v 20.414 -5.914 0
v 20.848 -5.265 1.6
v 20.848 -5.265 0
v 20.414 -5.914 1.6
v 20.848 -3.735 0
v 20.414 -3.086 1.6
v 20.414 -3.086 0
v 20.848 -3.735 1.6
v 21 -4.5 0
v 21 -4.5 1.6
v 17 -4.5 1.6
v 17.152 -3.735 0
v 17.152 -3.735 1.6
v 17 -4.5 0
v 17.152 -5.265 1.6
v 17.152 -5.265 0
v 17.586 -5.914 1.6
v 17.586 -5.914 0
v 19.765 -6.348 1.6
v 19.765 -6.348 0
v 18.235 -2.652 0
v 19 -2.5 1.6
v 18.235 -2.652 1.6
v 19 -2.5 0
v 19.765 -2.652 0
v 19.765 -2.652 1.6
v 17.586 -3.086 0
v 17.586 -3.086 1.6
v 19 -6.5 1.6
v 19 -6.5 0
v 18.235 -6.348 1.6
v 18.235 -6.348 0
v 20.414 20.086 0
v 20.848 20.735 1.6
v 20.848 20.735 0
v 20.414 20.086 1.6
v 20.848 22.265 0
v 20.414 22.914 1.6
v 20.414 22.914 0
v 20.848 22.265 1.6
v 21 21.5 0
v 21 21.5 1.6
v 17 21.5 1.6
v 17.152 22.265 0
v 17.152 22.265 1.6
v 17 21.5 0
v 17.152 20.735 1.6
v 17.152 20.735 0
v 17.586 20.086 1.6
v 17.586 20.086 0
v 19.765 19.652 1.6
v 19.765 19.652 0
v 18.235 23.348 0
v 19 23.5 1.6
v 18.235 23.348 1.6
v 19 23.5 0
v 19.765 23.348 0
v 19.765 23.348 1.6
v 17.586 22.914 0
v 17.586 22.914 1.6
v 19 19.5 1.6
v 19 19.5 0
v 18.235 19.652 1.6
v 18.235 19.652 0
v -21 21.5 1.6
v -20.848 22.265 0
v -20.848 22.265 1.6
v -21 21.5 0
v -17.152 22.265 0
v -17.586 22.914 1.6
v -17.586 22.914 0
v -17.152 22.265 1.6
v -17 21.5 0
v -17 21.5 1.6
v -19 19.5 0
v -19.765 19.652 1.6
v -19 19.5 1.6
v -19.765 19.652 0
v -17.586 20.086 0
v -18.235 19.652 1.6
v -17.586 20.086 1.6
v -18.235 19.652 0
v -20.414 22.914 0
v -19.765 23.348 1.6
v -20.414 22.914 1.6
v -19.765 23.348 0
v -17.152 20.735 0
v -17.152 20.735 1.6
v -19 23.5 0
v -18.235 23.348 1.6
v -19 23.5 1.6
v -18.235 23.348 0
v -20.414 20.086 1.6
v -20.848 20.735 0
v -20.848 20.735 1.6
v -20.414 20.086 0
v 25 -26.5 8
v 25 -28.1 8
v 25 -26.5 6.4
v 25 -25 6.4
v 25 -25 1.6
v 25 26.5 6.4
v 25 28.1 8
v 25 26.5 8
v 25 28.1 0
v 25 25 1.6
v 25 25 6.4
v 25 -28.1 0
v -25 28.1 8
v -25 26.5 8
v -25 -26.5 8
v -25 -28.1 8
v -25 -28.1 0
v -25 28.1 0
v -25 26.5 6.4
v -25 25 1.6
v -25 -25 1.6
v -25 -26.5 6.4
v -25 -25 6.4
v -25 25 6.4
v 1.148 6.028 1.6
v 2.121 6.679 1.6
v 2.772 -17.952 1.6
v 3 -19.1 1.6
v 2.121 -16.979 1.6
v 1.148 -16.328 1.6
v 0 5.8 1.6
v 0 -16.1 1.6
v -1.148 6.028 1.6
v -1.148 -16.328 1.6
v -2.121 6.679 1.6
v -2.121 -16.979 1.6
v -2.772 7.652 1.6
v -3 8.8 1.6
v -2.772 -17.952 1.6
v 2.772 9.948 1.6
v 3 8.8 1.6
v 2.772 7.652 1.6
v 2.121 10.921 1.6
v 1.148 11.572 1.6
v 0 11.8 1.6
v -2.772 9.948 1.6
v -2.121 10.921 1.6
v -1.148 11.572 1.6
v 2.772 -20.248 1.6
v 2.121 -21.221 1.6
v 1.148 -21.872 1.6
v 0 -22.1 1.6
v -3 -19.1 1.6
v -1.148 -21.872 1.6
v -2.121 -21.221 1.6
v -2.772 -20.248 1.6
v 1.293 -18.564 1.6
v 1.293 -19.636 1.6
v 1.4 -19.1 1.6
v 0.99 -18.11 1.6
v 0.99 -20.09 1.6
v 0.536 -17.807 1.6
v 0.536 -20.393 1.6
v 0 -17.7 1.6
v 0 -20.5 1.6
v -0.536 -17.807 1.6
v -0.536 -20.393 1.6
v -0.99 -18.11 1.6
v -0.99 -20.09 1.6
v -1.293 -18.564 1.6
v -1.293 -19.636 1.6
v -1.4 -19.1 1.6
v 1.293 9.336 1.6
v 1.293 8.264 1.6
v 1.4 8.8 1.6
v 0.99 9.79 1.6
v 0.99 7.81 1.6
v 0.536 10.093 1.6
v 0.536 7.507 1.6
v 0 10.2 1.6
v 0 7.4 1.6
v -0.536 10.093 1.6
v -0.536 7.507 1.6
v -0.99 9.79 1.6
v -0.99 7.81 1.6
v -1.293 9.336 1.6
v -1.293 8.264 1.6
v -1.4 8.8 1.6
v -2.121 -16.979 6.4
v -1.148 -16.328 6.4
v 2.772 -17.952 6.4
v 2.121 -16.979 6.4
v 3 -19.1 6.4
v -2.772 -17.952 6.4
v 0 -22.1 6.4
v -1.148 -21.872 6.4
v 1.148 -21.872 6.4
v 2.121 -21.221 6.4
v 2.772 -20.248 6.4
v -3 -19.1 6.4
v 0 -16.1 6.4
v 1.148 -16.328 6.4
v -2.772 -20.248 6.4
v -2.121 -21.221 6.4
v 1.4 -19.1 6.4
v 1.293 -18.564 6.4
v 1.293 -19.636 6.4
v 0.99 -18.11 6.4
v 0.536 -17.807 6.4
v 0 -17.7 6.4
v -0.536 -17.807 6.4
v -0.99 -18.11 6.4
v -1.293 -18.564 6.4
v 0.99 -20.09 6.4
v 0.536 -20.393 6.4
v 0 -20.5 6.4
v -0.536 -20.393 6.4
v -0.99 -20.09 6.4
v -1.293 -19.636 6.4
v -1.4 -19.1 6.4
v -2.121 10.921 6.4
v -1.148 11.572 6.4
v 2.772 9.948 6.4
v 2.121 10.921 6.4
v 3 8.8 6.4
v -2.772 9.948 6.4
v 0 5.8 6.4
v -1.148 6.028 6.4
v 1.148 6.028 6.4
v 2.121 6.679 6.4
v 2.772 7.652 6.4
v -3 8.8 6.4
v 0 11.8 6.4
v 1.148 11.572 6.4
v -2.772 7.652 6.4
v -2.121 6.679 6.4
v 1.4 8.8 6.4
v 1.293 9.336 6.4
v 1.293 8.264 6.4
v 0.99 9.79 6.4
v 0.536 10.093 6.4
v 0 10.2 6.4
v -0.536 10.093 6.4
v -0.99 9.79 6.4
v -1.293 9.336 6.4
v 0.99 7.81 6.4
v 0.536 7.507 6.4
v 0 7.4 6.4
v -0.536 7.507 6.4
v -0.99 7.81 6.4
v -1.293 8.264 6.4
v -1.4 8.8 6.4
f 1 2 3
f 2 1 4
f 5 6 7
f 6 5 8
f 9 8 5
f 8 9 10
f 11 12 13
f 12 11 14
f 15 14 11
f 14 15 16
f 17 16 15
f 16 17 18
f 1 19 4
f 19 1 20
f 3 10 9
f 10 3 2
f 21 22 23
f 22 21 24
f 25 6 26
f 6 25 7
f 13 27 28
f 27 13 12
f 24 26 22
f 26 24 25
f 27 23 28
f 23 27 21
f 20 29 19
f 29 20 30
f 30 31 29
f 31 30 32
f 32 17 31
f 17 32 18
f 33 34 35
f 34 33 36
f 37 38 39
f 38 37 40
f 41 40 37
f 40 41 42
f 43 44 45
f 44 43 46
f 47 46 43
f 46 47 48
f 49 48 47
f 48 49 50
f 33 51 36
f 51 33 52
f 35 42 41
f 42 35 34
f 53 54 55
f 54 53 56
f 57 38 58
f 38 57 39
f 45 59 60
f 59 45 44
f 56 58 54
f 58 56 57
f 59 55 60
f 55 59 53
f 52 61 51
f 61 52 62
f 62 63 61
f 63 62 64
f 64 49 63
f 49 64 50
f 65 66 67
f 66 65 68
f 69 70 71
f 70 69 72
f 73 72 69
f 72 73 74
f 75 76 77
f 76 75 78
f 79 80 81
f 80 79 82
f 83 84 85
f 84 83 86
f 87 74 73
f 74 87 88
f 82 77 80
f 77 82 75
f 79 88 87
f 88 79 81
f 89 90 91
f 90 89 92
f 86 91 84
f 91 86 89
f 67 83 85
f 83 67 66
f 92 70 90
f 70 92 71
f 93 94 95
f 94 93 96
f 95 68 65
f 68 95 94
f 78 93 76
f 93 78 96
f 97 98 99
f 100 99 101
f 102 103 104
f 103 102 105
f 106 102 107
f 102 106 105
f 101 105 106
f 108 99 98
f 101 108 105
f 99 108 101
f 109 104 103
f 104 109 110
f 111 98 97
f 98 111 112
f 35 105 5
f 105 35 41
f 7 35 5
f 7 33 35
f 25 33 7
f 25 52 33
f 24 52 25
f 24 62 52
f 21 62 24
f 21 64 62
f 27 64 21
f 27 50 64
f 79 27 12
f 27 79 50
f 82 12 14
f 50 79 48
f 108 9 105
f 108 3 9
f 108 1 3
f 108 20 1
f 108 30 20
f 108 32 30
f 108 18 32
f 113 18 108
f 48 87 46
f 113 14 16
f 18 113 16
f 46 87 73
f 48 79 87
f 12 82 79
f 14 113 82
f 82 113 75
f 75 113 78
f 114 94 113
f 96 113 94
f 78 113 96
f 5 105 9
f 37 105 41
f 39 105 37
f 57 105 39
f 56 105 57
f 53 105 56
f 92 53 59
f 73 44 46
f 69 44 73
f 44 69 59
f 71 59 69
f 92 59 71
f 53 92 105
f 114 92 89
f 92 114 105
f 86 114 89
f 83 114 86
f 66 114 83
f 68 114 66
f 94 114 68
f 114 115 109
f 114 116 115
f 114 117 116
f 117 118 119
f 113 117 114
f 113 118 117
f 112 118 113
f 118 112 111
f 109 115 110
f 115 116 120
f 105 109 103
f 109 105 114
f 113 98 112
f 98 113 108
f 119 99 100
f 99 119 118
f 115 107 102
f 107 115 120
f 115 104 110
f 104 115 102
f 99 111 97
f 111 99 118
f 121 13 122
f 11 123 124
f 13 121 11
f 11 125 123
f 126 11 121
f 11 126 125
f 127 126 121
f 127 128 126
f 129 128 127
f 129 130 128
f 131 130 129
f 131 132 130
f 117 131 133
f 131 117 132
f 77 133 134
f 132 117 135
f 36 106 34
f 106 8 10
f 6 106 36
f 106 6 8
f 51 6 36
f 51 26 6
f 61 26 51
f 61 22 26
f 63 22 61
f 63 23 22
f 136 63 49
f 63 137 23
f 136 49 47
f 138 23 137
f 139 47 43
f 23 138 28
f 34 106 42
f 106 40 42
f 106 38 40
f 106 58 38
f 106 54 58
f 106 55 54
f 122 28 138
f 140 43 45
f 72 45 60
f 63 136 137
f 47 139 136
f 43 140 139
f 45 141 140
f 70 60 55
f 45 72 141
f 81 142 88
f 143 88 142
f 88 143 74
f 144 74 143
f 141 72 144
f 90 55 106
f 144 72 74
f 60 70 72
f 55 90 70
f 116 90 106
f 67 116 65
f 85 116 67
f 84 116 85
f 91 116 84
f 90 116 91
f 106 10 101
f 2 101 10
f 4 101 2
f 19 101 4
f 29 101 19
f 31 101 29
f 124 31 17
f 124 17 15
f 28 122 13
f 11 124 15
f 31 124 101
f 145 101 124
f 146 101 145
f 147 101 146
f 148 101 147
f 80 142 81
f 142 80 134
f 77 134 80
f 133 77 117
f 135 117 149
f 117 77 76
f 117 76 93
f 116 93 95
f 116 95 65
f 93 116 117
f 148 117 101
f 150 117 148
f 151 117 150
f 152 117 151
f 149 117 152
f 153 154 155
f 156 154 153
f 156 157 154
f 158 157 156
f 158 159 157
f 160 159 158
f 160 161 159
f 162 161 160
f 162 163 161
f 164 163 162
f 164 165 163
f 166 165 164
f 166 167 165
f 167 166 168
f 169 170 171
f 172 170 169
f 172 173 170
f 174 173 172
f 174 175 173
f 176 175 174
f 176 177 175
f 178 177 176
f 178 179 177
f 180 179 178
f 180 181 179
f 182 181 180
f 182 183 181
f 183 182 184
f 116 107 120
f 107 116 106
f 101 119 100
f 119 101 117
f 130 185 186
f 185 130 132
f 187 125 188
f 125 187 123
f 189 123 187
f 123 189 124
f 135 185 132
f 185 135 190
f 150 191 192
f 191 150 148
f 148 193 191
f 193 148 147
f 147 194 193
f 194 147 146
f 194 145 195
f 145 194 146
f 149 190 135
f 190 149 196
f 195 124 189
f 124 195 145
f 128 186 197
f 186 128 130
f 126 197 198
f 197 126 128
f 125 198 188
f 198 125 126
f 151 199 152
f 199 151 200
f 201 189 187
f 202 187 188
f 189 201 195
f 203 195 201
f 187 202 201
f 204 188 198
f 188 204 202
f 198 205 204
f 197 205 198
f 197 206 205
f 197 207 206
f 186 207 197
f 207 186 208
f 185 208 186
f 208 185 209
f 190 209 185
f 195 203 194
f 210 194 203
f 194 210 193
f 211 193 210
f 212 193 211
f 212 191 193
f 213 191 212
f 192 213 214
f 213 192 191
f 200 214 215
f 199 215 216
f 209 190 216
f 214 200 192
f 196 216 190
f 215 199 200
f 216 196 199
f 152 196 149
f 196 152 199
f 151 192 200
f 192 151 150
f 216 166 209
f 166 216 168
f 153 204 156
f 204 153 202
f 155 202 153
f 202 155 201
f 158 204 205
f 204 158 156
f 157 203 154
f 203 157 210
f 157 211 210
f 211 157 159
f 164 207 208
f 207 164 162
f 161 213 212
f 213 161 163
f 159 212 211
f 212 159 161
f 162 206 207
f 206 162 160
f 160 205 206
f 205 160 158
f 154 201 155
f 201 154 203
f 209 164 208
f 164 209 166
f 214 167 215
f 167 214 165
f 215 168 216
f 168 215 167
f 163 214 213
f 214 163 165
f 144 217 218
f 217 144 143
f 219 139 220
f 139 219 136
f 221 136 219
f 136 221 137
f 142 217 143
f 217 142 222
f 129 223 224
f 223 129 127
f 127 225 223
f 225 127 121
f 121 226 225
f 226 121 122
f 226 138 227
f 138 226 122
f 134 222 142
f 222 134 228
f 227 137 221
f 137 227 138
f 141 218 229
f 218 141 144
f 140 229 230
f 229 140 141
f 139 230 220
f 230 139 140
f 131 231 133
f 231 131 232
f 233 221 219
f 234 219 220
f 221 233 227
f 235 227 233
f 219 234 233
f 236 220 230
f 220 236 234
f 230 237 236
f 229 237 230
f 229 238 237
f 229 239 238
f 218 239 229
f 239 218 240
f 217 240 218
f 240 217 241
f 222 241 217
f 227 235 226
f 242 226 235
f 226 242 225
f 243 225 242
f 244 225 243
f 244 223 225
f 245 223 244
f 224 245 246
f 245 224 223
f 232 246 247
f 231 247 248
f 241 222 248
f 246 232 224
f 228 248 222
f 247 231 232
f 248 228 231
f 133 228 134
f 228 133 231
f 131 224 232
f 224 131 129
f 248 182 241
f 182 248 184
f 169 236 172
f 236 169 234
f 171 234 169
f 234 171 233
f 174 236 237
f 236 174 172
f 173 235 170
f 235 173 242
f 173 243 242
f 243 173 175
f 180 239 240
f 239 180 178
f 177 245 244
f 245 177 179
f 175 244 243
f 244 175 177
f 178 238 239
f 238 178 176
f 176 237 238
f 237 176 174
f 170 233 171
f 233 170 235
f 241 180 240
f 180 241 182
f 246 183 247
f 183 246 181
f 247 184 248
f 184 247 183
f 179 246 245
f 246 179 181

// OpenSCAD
// file: syms.scad
module symY(t) {
    translate(t)
        children();
    mirror([0,1,0])
        translate(t)
            children();
}
module symX(t) {
    translate(t)
        children();
    mirror([1,0,0])
        translate(t)
            children();
}

module	symXY(t) {
	tx=t[0];
	ty=t[1];
	tz=t[2];
	symX([tx,0,0])
	symY([0,ty,tz])
		children();
}
// main file
include <syms.scad>
//include <9g_servo.scad>

HOLE_D=4;


module plexiHole() {
    $fn=16;
    cylinder(d=HOLE_D,h=16,center=true);
}

module servo_mount() {
    SERVO_W=12.5;
    SERVO_H=15.5;
    W=1.6;
    L=40;
    
    $fn=16;
    
    difference() {
        translate([L/2-2.5*HOLE_D,0,(SERVO_H+W)/2])
        cube([L,SERVO_W+2*W,SERVO_H+W],center=true);
    
        translate([L/2,0,SERVO_H/2+W])
        cube([L,SERVO_W+.1,SERVO_H+.1],center=true);
    
        translate([-L/2-W,0,(SERVO_H-W)/2+W])
        cube([L,L,SERVO_H-W],center=true);
    
        translate([-1.3-1.1,0,SERVO_H+W])
        cylinder(d=2.2,h=SERVO_H*2,center=true);
    
        
        translate([L/2,0,SERVO_H])
    rotate(40,[0,1,0])
        cube([2*L,L,L/2],center=true);

        translate([-HOLE_D-W-L/2,0,L/2+W])
        cube([L,L,L],center=true);
    
    
        translate([-1.5*HOLE_D,0,0])
        symY([0,(6+HOLE_D)/2,0]) {
            plexiHole();
        }
    }
    
    
//    translate([0,0,1/2])
  //  9g_motor();
}

module stepdown_mount() {
    W=1.6;
    S=60.4;
    D2=3.2;
    
    difference() {
        cube([4*HOLE_D+W,S+2*D2+2*W,3*W],center=true);
        
        M=200;
        translate([W/2,-M/2,0])
        cube([M,M,M]);
        
        translate([-M-W/2,-M/2,-M])
        cube([M,M,M]);
        
        symY([W/2+HOLE_D,(6+HOLE_D)/2,0]) {
            plexiHole();
        }
        
        symY([-W/2-HOLE_D,(S+D2)/2,0]) {
            $fn=16;cylinder(d=D2,center=true,h=32);
        }
    }
}

module board_mount() {
    W=1.6;
    S=60.4;
    D2=3.2;
    H1=4*W;
    H2=5*W;
    
    L=50;
    B_W=53;
    
    difference() {
        translate([0,0,H2/2])
        cube([L,B_W+2*W,H2],center=true);
        
        translate([0,0,H2/2+H1])
        cube([L+1,B_W,H2],center=true);
        
        translate([0,0,H2/2+W])
        cube([L+1,B_W-2*1.5,H2],center=true);

        translate([L/2,-B_W/2,0]) {
            // top left corner
            Y1=20+HOLE_D/2;
            Y2=Y1+22+HOLE_D;
            XX2=34+HOLE_D;
            
            X1=(L-XX2)/2;
            X2=X1+XX2;
            translate([-X1,Y1,0])    plexiHole();
            translate([-X1,Y2,0])    plexiHole();
            translate([-X2,Y2,0])    plexiHole();
       //     plexiHole();
            
        }
    }
        translate([0,-B_W/2,0]) {
            // top left corner
            DF=3.2;
            C1=5.8+DF/2;
            C2=33.7+DF/2;
            for(x=[C1,C2]) 
            translate([0,x,0]) {
                $fn=16;
                difference() {
                cylinder(d=6,h=H1);
                cylinder(d=2.8,h=H1*2);
                }
            }
        }
    
}



mode="servo_mount";
if(mode=="servo_mount"){
    servo_mount();
}

mode="stepdown_mount";
if(mode=="stepdown_mount"){
    stepdown_mount();
}

mode="board_mount";
if(mode=="board_mount"){
    board_mount();
}
